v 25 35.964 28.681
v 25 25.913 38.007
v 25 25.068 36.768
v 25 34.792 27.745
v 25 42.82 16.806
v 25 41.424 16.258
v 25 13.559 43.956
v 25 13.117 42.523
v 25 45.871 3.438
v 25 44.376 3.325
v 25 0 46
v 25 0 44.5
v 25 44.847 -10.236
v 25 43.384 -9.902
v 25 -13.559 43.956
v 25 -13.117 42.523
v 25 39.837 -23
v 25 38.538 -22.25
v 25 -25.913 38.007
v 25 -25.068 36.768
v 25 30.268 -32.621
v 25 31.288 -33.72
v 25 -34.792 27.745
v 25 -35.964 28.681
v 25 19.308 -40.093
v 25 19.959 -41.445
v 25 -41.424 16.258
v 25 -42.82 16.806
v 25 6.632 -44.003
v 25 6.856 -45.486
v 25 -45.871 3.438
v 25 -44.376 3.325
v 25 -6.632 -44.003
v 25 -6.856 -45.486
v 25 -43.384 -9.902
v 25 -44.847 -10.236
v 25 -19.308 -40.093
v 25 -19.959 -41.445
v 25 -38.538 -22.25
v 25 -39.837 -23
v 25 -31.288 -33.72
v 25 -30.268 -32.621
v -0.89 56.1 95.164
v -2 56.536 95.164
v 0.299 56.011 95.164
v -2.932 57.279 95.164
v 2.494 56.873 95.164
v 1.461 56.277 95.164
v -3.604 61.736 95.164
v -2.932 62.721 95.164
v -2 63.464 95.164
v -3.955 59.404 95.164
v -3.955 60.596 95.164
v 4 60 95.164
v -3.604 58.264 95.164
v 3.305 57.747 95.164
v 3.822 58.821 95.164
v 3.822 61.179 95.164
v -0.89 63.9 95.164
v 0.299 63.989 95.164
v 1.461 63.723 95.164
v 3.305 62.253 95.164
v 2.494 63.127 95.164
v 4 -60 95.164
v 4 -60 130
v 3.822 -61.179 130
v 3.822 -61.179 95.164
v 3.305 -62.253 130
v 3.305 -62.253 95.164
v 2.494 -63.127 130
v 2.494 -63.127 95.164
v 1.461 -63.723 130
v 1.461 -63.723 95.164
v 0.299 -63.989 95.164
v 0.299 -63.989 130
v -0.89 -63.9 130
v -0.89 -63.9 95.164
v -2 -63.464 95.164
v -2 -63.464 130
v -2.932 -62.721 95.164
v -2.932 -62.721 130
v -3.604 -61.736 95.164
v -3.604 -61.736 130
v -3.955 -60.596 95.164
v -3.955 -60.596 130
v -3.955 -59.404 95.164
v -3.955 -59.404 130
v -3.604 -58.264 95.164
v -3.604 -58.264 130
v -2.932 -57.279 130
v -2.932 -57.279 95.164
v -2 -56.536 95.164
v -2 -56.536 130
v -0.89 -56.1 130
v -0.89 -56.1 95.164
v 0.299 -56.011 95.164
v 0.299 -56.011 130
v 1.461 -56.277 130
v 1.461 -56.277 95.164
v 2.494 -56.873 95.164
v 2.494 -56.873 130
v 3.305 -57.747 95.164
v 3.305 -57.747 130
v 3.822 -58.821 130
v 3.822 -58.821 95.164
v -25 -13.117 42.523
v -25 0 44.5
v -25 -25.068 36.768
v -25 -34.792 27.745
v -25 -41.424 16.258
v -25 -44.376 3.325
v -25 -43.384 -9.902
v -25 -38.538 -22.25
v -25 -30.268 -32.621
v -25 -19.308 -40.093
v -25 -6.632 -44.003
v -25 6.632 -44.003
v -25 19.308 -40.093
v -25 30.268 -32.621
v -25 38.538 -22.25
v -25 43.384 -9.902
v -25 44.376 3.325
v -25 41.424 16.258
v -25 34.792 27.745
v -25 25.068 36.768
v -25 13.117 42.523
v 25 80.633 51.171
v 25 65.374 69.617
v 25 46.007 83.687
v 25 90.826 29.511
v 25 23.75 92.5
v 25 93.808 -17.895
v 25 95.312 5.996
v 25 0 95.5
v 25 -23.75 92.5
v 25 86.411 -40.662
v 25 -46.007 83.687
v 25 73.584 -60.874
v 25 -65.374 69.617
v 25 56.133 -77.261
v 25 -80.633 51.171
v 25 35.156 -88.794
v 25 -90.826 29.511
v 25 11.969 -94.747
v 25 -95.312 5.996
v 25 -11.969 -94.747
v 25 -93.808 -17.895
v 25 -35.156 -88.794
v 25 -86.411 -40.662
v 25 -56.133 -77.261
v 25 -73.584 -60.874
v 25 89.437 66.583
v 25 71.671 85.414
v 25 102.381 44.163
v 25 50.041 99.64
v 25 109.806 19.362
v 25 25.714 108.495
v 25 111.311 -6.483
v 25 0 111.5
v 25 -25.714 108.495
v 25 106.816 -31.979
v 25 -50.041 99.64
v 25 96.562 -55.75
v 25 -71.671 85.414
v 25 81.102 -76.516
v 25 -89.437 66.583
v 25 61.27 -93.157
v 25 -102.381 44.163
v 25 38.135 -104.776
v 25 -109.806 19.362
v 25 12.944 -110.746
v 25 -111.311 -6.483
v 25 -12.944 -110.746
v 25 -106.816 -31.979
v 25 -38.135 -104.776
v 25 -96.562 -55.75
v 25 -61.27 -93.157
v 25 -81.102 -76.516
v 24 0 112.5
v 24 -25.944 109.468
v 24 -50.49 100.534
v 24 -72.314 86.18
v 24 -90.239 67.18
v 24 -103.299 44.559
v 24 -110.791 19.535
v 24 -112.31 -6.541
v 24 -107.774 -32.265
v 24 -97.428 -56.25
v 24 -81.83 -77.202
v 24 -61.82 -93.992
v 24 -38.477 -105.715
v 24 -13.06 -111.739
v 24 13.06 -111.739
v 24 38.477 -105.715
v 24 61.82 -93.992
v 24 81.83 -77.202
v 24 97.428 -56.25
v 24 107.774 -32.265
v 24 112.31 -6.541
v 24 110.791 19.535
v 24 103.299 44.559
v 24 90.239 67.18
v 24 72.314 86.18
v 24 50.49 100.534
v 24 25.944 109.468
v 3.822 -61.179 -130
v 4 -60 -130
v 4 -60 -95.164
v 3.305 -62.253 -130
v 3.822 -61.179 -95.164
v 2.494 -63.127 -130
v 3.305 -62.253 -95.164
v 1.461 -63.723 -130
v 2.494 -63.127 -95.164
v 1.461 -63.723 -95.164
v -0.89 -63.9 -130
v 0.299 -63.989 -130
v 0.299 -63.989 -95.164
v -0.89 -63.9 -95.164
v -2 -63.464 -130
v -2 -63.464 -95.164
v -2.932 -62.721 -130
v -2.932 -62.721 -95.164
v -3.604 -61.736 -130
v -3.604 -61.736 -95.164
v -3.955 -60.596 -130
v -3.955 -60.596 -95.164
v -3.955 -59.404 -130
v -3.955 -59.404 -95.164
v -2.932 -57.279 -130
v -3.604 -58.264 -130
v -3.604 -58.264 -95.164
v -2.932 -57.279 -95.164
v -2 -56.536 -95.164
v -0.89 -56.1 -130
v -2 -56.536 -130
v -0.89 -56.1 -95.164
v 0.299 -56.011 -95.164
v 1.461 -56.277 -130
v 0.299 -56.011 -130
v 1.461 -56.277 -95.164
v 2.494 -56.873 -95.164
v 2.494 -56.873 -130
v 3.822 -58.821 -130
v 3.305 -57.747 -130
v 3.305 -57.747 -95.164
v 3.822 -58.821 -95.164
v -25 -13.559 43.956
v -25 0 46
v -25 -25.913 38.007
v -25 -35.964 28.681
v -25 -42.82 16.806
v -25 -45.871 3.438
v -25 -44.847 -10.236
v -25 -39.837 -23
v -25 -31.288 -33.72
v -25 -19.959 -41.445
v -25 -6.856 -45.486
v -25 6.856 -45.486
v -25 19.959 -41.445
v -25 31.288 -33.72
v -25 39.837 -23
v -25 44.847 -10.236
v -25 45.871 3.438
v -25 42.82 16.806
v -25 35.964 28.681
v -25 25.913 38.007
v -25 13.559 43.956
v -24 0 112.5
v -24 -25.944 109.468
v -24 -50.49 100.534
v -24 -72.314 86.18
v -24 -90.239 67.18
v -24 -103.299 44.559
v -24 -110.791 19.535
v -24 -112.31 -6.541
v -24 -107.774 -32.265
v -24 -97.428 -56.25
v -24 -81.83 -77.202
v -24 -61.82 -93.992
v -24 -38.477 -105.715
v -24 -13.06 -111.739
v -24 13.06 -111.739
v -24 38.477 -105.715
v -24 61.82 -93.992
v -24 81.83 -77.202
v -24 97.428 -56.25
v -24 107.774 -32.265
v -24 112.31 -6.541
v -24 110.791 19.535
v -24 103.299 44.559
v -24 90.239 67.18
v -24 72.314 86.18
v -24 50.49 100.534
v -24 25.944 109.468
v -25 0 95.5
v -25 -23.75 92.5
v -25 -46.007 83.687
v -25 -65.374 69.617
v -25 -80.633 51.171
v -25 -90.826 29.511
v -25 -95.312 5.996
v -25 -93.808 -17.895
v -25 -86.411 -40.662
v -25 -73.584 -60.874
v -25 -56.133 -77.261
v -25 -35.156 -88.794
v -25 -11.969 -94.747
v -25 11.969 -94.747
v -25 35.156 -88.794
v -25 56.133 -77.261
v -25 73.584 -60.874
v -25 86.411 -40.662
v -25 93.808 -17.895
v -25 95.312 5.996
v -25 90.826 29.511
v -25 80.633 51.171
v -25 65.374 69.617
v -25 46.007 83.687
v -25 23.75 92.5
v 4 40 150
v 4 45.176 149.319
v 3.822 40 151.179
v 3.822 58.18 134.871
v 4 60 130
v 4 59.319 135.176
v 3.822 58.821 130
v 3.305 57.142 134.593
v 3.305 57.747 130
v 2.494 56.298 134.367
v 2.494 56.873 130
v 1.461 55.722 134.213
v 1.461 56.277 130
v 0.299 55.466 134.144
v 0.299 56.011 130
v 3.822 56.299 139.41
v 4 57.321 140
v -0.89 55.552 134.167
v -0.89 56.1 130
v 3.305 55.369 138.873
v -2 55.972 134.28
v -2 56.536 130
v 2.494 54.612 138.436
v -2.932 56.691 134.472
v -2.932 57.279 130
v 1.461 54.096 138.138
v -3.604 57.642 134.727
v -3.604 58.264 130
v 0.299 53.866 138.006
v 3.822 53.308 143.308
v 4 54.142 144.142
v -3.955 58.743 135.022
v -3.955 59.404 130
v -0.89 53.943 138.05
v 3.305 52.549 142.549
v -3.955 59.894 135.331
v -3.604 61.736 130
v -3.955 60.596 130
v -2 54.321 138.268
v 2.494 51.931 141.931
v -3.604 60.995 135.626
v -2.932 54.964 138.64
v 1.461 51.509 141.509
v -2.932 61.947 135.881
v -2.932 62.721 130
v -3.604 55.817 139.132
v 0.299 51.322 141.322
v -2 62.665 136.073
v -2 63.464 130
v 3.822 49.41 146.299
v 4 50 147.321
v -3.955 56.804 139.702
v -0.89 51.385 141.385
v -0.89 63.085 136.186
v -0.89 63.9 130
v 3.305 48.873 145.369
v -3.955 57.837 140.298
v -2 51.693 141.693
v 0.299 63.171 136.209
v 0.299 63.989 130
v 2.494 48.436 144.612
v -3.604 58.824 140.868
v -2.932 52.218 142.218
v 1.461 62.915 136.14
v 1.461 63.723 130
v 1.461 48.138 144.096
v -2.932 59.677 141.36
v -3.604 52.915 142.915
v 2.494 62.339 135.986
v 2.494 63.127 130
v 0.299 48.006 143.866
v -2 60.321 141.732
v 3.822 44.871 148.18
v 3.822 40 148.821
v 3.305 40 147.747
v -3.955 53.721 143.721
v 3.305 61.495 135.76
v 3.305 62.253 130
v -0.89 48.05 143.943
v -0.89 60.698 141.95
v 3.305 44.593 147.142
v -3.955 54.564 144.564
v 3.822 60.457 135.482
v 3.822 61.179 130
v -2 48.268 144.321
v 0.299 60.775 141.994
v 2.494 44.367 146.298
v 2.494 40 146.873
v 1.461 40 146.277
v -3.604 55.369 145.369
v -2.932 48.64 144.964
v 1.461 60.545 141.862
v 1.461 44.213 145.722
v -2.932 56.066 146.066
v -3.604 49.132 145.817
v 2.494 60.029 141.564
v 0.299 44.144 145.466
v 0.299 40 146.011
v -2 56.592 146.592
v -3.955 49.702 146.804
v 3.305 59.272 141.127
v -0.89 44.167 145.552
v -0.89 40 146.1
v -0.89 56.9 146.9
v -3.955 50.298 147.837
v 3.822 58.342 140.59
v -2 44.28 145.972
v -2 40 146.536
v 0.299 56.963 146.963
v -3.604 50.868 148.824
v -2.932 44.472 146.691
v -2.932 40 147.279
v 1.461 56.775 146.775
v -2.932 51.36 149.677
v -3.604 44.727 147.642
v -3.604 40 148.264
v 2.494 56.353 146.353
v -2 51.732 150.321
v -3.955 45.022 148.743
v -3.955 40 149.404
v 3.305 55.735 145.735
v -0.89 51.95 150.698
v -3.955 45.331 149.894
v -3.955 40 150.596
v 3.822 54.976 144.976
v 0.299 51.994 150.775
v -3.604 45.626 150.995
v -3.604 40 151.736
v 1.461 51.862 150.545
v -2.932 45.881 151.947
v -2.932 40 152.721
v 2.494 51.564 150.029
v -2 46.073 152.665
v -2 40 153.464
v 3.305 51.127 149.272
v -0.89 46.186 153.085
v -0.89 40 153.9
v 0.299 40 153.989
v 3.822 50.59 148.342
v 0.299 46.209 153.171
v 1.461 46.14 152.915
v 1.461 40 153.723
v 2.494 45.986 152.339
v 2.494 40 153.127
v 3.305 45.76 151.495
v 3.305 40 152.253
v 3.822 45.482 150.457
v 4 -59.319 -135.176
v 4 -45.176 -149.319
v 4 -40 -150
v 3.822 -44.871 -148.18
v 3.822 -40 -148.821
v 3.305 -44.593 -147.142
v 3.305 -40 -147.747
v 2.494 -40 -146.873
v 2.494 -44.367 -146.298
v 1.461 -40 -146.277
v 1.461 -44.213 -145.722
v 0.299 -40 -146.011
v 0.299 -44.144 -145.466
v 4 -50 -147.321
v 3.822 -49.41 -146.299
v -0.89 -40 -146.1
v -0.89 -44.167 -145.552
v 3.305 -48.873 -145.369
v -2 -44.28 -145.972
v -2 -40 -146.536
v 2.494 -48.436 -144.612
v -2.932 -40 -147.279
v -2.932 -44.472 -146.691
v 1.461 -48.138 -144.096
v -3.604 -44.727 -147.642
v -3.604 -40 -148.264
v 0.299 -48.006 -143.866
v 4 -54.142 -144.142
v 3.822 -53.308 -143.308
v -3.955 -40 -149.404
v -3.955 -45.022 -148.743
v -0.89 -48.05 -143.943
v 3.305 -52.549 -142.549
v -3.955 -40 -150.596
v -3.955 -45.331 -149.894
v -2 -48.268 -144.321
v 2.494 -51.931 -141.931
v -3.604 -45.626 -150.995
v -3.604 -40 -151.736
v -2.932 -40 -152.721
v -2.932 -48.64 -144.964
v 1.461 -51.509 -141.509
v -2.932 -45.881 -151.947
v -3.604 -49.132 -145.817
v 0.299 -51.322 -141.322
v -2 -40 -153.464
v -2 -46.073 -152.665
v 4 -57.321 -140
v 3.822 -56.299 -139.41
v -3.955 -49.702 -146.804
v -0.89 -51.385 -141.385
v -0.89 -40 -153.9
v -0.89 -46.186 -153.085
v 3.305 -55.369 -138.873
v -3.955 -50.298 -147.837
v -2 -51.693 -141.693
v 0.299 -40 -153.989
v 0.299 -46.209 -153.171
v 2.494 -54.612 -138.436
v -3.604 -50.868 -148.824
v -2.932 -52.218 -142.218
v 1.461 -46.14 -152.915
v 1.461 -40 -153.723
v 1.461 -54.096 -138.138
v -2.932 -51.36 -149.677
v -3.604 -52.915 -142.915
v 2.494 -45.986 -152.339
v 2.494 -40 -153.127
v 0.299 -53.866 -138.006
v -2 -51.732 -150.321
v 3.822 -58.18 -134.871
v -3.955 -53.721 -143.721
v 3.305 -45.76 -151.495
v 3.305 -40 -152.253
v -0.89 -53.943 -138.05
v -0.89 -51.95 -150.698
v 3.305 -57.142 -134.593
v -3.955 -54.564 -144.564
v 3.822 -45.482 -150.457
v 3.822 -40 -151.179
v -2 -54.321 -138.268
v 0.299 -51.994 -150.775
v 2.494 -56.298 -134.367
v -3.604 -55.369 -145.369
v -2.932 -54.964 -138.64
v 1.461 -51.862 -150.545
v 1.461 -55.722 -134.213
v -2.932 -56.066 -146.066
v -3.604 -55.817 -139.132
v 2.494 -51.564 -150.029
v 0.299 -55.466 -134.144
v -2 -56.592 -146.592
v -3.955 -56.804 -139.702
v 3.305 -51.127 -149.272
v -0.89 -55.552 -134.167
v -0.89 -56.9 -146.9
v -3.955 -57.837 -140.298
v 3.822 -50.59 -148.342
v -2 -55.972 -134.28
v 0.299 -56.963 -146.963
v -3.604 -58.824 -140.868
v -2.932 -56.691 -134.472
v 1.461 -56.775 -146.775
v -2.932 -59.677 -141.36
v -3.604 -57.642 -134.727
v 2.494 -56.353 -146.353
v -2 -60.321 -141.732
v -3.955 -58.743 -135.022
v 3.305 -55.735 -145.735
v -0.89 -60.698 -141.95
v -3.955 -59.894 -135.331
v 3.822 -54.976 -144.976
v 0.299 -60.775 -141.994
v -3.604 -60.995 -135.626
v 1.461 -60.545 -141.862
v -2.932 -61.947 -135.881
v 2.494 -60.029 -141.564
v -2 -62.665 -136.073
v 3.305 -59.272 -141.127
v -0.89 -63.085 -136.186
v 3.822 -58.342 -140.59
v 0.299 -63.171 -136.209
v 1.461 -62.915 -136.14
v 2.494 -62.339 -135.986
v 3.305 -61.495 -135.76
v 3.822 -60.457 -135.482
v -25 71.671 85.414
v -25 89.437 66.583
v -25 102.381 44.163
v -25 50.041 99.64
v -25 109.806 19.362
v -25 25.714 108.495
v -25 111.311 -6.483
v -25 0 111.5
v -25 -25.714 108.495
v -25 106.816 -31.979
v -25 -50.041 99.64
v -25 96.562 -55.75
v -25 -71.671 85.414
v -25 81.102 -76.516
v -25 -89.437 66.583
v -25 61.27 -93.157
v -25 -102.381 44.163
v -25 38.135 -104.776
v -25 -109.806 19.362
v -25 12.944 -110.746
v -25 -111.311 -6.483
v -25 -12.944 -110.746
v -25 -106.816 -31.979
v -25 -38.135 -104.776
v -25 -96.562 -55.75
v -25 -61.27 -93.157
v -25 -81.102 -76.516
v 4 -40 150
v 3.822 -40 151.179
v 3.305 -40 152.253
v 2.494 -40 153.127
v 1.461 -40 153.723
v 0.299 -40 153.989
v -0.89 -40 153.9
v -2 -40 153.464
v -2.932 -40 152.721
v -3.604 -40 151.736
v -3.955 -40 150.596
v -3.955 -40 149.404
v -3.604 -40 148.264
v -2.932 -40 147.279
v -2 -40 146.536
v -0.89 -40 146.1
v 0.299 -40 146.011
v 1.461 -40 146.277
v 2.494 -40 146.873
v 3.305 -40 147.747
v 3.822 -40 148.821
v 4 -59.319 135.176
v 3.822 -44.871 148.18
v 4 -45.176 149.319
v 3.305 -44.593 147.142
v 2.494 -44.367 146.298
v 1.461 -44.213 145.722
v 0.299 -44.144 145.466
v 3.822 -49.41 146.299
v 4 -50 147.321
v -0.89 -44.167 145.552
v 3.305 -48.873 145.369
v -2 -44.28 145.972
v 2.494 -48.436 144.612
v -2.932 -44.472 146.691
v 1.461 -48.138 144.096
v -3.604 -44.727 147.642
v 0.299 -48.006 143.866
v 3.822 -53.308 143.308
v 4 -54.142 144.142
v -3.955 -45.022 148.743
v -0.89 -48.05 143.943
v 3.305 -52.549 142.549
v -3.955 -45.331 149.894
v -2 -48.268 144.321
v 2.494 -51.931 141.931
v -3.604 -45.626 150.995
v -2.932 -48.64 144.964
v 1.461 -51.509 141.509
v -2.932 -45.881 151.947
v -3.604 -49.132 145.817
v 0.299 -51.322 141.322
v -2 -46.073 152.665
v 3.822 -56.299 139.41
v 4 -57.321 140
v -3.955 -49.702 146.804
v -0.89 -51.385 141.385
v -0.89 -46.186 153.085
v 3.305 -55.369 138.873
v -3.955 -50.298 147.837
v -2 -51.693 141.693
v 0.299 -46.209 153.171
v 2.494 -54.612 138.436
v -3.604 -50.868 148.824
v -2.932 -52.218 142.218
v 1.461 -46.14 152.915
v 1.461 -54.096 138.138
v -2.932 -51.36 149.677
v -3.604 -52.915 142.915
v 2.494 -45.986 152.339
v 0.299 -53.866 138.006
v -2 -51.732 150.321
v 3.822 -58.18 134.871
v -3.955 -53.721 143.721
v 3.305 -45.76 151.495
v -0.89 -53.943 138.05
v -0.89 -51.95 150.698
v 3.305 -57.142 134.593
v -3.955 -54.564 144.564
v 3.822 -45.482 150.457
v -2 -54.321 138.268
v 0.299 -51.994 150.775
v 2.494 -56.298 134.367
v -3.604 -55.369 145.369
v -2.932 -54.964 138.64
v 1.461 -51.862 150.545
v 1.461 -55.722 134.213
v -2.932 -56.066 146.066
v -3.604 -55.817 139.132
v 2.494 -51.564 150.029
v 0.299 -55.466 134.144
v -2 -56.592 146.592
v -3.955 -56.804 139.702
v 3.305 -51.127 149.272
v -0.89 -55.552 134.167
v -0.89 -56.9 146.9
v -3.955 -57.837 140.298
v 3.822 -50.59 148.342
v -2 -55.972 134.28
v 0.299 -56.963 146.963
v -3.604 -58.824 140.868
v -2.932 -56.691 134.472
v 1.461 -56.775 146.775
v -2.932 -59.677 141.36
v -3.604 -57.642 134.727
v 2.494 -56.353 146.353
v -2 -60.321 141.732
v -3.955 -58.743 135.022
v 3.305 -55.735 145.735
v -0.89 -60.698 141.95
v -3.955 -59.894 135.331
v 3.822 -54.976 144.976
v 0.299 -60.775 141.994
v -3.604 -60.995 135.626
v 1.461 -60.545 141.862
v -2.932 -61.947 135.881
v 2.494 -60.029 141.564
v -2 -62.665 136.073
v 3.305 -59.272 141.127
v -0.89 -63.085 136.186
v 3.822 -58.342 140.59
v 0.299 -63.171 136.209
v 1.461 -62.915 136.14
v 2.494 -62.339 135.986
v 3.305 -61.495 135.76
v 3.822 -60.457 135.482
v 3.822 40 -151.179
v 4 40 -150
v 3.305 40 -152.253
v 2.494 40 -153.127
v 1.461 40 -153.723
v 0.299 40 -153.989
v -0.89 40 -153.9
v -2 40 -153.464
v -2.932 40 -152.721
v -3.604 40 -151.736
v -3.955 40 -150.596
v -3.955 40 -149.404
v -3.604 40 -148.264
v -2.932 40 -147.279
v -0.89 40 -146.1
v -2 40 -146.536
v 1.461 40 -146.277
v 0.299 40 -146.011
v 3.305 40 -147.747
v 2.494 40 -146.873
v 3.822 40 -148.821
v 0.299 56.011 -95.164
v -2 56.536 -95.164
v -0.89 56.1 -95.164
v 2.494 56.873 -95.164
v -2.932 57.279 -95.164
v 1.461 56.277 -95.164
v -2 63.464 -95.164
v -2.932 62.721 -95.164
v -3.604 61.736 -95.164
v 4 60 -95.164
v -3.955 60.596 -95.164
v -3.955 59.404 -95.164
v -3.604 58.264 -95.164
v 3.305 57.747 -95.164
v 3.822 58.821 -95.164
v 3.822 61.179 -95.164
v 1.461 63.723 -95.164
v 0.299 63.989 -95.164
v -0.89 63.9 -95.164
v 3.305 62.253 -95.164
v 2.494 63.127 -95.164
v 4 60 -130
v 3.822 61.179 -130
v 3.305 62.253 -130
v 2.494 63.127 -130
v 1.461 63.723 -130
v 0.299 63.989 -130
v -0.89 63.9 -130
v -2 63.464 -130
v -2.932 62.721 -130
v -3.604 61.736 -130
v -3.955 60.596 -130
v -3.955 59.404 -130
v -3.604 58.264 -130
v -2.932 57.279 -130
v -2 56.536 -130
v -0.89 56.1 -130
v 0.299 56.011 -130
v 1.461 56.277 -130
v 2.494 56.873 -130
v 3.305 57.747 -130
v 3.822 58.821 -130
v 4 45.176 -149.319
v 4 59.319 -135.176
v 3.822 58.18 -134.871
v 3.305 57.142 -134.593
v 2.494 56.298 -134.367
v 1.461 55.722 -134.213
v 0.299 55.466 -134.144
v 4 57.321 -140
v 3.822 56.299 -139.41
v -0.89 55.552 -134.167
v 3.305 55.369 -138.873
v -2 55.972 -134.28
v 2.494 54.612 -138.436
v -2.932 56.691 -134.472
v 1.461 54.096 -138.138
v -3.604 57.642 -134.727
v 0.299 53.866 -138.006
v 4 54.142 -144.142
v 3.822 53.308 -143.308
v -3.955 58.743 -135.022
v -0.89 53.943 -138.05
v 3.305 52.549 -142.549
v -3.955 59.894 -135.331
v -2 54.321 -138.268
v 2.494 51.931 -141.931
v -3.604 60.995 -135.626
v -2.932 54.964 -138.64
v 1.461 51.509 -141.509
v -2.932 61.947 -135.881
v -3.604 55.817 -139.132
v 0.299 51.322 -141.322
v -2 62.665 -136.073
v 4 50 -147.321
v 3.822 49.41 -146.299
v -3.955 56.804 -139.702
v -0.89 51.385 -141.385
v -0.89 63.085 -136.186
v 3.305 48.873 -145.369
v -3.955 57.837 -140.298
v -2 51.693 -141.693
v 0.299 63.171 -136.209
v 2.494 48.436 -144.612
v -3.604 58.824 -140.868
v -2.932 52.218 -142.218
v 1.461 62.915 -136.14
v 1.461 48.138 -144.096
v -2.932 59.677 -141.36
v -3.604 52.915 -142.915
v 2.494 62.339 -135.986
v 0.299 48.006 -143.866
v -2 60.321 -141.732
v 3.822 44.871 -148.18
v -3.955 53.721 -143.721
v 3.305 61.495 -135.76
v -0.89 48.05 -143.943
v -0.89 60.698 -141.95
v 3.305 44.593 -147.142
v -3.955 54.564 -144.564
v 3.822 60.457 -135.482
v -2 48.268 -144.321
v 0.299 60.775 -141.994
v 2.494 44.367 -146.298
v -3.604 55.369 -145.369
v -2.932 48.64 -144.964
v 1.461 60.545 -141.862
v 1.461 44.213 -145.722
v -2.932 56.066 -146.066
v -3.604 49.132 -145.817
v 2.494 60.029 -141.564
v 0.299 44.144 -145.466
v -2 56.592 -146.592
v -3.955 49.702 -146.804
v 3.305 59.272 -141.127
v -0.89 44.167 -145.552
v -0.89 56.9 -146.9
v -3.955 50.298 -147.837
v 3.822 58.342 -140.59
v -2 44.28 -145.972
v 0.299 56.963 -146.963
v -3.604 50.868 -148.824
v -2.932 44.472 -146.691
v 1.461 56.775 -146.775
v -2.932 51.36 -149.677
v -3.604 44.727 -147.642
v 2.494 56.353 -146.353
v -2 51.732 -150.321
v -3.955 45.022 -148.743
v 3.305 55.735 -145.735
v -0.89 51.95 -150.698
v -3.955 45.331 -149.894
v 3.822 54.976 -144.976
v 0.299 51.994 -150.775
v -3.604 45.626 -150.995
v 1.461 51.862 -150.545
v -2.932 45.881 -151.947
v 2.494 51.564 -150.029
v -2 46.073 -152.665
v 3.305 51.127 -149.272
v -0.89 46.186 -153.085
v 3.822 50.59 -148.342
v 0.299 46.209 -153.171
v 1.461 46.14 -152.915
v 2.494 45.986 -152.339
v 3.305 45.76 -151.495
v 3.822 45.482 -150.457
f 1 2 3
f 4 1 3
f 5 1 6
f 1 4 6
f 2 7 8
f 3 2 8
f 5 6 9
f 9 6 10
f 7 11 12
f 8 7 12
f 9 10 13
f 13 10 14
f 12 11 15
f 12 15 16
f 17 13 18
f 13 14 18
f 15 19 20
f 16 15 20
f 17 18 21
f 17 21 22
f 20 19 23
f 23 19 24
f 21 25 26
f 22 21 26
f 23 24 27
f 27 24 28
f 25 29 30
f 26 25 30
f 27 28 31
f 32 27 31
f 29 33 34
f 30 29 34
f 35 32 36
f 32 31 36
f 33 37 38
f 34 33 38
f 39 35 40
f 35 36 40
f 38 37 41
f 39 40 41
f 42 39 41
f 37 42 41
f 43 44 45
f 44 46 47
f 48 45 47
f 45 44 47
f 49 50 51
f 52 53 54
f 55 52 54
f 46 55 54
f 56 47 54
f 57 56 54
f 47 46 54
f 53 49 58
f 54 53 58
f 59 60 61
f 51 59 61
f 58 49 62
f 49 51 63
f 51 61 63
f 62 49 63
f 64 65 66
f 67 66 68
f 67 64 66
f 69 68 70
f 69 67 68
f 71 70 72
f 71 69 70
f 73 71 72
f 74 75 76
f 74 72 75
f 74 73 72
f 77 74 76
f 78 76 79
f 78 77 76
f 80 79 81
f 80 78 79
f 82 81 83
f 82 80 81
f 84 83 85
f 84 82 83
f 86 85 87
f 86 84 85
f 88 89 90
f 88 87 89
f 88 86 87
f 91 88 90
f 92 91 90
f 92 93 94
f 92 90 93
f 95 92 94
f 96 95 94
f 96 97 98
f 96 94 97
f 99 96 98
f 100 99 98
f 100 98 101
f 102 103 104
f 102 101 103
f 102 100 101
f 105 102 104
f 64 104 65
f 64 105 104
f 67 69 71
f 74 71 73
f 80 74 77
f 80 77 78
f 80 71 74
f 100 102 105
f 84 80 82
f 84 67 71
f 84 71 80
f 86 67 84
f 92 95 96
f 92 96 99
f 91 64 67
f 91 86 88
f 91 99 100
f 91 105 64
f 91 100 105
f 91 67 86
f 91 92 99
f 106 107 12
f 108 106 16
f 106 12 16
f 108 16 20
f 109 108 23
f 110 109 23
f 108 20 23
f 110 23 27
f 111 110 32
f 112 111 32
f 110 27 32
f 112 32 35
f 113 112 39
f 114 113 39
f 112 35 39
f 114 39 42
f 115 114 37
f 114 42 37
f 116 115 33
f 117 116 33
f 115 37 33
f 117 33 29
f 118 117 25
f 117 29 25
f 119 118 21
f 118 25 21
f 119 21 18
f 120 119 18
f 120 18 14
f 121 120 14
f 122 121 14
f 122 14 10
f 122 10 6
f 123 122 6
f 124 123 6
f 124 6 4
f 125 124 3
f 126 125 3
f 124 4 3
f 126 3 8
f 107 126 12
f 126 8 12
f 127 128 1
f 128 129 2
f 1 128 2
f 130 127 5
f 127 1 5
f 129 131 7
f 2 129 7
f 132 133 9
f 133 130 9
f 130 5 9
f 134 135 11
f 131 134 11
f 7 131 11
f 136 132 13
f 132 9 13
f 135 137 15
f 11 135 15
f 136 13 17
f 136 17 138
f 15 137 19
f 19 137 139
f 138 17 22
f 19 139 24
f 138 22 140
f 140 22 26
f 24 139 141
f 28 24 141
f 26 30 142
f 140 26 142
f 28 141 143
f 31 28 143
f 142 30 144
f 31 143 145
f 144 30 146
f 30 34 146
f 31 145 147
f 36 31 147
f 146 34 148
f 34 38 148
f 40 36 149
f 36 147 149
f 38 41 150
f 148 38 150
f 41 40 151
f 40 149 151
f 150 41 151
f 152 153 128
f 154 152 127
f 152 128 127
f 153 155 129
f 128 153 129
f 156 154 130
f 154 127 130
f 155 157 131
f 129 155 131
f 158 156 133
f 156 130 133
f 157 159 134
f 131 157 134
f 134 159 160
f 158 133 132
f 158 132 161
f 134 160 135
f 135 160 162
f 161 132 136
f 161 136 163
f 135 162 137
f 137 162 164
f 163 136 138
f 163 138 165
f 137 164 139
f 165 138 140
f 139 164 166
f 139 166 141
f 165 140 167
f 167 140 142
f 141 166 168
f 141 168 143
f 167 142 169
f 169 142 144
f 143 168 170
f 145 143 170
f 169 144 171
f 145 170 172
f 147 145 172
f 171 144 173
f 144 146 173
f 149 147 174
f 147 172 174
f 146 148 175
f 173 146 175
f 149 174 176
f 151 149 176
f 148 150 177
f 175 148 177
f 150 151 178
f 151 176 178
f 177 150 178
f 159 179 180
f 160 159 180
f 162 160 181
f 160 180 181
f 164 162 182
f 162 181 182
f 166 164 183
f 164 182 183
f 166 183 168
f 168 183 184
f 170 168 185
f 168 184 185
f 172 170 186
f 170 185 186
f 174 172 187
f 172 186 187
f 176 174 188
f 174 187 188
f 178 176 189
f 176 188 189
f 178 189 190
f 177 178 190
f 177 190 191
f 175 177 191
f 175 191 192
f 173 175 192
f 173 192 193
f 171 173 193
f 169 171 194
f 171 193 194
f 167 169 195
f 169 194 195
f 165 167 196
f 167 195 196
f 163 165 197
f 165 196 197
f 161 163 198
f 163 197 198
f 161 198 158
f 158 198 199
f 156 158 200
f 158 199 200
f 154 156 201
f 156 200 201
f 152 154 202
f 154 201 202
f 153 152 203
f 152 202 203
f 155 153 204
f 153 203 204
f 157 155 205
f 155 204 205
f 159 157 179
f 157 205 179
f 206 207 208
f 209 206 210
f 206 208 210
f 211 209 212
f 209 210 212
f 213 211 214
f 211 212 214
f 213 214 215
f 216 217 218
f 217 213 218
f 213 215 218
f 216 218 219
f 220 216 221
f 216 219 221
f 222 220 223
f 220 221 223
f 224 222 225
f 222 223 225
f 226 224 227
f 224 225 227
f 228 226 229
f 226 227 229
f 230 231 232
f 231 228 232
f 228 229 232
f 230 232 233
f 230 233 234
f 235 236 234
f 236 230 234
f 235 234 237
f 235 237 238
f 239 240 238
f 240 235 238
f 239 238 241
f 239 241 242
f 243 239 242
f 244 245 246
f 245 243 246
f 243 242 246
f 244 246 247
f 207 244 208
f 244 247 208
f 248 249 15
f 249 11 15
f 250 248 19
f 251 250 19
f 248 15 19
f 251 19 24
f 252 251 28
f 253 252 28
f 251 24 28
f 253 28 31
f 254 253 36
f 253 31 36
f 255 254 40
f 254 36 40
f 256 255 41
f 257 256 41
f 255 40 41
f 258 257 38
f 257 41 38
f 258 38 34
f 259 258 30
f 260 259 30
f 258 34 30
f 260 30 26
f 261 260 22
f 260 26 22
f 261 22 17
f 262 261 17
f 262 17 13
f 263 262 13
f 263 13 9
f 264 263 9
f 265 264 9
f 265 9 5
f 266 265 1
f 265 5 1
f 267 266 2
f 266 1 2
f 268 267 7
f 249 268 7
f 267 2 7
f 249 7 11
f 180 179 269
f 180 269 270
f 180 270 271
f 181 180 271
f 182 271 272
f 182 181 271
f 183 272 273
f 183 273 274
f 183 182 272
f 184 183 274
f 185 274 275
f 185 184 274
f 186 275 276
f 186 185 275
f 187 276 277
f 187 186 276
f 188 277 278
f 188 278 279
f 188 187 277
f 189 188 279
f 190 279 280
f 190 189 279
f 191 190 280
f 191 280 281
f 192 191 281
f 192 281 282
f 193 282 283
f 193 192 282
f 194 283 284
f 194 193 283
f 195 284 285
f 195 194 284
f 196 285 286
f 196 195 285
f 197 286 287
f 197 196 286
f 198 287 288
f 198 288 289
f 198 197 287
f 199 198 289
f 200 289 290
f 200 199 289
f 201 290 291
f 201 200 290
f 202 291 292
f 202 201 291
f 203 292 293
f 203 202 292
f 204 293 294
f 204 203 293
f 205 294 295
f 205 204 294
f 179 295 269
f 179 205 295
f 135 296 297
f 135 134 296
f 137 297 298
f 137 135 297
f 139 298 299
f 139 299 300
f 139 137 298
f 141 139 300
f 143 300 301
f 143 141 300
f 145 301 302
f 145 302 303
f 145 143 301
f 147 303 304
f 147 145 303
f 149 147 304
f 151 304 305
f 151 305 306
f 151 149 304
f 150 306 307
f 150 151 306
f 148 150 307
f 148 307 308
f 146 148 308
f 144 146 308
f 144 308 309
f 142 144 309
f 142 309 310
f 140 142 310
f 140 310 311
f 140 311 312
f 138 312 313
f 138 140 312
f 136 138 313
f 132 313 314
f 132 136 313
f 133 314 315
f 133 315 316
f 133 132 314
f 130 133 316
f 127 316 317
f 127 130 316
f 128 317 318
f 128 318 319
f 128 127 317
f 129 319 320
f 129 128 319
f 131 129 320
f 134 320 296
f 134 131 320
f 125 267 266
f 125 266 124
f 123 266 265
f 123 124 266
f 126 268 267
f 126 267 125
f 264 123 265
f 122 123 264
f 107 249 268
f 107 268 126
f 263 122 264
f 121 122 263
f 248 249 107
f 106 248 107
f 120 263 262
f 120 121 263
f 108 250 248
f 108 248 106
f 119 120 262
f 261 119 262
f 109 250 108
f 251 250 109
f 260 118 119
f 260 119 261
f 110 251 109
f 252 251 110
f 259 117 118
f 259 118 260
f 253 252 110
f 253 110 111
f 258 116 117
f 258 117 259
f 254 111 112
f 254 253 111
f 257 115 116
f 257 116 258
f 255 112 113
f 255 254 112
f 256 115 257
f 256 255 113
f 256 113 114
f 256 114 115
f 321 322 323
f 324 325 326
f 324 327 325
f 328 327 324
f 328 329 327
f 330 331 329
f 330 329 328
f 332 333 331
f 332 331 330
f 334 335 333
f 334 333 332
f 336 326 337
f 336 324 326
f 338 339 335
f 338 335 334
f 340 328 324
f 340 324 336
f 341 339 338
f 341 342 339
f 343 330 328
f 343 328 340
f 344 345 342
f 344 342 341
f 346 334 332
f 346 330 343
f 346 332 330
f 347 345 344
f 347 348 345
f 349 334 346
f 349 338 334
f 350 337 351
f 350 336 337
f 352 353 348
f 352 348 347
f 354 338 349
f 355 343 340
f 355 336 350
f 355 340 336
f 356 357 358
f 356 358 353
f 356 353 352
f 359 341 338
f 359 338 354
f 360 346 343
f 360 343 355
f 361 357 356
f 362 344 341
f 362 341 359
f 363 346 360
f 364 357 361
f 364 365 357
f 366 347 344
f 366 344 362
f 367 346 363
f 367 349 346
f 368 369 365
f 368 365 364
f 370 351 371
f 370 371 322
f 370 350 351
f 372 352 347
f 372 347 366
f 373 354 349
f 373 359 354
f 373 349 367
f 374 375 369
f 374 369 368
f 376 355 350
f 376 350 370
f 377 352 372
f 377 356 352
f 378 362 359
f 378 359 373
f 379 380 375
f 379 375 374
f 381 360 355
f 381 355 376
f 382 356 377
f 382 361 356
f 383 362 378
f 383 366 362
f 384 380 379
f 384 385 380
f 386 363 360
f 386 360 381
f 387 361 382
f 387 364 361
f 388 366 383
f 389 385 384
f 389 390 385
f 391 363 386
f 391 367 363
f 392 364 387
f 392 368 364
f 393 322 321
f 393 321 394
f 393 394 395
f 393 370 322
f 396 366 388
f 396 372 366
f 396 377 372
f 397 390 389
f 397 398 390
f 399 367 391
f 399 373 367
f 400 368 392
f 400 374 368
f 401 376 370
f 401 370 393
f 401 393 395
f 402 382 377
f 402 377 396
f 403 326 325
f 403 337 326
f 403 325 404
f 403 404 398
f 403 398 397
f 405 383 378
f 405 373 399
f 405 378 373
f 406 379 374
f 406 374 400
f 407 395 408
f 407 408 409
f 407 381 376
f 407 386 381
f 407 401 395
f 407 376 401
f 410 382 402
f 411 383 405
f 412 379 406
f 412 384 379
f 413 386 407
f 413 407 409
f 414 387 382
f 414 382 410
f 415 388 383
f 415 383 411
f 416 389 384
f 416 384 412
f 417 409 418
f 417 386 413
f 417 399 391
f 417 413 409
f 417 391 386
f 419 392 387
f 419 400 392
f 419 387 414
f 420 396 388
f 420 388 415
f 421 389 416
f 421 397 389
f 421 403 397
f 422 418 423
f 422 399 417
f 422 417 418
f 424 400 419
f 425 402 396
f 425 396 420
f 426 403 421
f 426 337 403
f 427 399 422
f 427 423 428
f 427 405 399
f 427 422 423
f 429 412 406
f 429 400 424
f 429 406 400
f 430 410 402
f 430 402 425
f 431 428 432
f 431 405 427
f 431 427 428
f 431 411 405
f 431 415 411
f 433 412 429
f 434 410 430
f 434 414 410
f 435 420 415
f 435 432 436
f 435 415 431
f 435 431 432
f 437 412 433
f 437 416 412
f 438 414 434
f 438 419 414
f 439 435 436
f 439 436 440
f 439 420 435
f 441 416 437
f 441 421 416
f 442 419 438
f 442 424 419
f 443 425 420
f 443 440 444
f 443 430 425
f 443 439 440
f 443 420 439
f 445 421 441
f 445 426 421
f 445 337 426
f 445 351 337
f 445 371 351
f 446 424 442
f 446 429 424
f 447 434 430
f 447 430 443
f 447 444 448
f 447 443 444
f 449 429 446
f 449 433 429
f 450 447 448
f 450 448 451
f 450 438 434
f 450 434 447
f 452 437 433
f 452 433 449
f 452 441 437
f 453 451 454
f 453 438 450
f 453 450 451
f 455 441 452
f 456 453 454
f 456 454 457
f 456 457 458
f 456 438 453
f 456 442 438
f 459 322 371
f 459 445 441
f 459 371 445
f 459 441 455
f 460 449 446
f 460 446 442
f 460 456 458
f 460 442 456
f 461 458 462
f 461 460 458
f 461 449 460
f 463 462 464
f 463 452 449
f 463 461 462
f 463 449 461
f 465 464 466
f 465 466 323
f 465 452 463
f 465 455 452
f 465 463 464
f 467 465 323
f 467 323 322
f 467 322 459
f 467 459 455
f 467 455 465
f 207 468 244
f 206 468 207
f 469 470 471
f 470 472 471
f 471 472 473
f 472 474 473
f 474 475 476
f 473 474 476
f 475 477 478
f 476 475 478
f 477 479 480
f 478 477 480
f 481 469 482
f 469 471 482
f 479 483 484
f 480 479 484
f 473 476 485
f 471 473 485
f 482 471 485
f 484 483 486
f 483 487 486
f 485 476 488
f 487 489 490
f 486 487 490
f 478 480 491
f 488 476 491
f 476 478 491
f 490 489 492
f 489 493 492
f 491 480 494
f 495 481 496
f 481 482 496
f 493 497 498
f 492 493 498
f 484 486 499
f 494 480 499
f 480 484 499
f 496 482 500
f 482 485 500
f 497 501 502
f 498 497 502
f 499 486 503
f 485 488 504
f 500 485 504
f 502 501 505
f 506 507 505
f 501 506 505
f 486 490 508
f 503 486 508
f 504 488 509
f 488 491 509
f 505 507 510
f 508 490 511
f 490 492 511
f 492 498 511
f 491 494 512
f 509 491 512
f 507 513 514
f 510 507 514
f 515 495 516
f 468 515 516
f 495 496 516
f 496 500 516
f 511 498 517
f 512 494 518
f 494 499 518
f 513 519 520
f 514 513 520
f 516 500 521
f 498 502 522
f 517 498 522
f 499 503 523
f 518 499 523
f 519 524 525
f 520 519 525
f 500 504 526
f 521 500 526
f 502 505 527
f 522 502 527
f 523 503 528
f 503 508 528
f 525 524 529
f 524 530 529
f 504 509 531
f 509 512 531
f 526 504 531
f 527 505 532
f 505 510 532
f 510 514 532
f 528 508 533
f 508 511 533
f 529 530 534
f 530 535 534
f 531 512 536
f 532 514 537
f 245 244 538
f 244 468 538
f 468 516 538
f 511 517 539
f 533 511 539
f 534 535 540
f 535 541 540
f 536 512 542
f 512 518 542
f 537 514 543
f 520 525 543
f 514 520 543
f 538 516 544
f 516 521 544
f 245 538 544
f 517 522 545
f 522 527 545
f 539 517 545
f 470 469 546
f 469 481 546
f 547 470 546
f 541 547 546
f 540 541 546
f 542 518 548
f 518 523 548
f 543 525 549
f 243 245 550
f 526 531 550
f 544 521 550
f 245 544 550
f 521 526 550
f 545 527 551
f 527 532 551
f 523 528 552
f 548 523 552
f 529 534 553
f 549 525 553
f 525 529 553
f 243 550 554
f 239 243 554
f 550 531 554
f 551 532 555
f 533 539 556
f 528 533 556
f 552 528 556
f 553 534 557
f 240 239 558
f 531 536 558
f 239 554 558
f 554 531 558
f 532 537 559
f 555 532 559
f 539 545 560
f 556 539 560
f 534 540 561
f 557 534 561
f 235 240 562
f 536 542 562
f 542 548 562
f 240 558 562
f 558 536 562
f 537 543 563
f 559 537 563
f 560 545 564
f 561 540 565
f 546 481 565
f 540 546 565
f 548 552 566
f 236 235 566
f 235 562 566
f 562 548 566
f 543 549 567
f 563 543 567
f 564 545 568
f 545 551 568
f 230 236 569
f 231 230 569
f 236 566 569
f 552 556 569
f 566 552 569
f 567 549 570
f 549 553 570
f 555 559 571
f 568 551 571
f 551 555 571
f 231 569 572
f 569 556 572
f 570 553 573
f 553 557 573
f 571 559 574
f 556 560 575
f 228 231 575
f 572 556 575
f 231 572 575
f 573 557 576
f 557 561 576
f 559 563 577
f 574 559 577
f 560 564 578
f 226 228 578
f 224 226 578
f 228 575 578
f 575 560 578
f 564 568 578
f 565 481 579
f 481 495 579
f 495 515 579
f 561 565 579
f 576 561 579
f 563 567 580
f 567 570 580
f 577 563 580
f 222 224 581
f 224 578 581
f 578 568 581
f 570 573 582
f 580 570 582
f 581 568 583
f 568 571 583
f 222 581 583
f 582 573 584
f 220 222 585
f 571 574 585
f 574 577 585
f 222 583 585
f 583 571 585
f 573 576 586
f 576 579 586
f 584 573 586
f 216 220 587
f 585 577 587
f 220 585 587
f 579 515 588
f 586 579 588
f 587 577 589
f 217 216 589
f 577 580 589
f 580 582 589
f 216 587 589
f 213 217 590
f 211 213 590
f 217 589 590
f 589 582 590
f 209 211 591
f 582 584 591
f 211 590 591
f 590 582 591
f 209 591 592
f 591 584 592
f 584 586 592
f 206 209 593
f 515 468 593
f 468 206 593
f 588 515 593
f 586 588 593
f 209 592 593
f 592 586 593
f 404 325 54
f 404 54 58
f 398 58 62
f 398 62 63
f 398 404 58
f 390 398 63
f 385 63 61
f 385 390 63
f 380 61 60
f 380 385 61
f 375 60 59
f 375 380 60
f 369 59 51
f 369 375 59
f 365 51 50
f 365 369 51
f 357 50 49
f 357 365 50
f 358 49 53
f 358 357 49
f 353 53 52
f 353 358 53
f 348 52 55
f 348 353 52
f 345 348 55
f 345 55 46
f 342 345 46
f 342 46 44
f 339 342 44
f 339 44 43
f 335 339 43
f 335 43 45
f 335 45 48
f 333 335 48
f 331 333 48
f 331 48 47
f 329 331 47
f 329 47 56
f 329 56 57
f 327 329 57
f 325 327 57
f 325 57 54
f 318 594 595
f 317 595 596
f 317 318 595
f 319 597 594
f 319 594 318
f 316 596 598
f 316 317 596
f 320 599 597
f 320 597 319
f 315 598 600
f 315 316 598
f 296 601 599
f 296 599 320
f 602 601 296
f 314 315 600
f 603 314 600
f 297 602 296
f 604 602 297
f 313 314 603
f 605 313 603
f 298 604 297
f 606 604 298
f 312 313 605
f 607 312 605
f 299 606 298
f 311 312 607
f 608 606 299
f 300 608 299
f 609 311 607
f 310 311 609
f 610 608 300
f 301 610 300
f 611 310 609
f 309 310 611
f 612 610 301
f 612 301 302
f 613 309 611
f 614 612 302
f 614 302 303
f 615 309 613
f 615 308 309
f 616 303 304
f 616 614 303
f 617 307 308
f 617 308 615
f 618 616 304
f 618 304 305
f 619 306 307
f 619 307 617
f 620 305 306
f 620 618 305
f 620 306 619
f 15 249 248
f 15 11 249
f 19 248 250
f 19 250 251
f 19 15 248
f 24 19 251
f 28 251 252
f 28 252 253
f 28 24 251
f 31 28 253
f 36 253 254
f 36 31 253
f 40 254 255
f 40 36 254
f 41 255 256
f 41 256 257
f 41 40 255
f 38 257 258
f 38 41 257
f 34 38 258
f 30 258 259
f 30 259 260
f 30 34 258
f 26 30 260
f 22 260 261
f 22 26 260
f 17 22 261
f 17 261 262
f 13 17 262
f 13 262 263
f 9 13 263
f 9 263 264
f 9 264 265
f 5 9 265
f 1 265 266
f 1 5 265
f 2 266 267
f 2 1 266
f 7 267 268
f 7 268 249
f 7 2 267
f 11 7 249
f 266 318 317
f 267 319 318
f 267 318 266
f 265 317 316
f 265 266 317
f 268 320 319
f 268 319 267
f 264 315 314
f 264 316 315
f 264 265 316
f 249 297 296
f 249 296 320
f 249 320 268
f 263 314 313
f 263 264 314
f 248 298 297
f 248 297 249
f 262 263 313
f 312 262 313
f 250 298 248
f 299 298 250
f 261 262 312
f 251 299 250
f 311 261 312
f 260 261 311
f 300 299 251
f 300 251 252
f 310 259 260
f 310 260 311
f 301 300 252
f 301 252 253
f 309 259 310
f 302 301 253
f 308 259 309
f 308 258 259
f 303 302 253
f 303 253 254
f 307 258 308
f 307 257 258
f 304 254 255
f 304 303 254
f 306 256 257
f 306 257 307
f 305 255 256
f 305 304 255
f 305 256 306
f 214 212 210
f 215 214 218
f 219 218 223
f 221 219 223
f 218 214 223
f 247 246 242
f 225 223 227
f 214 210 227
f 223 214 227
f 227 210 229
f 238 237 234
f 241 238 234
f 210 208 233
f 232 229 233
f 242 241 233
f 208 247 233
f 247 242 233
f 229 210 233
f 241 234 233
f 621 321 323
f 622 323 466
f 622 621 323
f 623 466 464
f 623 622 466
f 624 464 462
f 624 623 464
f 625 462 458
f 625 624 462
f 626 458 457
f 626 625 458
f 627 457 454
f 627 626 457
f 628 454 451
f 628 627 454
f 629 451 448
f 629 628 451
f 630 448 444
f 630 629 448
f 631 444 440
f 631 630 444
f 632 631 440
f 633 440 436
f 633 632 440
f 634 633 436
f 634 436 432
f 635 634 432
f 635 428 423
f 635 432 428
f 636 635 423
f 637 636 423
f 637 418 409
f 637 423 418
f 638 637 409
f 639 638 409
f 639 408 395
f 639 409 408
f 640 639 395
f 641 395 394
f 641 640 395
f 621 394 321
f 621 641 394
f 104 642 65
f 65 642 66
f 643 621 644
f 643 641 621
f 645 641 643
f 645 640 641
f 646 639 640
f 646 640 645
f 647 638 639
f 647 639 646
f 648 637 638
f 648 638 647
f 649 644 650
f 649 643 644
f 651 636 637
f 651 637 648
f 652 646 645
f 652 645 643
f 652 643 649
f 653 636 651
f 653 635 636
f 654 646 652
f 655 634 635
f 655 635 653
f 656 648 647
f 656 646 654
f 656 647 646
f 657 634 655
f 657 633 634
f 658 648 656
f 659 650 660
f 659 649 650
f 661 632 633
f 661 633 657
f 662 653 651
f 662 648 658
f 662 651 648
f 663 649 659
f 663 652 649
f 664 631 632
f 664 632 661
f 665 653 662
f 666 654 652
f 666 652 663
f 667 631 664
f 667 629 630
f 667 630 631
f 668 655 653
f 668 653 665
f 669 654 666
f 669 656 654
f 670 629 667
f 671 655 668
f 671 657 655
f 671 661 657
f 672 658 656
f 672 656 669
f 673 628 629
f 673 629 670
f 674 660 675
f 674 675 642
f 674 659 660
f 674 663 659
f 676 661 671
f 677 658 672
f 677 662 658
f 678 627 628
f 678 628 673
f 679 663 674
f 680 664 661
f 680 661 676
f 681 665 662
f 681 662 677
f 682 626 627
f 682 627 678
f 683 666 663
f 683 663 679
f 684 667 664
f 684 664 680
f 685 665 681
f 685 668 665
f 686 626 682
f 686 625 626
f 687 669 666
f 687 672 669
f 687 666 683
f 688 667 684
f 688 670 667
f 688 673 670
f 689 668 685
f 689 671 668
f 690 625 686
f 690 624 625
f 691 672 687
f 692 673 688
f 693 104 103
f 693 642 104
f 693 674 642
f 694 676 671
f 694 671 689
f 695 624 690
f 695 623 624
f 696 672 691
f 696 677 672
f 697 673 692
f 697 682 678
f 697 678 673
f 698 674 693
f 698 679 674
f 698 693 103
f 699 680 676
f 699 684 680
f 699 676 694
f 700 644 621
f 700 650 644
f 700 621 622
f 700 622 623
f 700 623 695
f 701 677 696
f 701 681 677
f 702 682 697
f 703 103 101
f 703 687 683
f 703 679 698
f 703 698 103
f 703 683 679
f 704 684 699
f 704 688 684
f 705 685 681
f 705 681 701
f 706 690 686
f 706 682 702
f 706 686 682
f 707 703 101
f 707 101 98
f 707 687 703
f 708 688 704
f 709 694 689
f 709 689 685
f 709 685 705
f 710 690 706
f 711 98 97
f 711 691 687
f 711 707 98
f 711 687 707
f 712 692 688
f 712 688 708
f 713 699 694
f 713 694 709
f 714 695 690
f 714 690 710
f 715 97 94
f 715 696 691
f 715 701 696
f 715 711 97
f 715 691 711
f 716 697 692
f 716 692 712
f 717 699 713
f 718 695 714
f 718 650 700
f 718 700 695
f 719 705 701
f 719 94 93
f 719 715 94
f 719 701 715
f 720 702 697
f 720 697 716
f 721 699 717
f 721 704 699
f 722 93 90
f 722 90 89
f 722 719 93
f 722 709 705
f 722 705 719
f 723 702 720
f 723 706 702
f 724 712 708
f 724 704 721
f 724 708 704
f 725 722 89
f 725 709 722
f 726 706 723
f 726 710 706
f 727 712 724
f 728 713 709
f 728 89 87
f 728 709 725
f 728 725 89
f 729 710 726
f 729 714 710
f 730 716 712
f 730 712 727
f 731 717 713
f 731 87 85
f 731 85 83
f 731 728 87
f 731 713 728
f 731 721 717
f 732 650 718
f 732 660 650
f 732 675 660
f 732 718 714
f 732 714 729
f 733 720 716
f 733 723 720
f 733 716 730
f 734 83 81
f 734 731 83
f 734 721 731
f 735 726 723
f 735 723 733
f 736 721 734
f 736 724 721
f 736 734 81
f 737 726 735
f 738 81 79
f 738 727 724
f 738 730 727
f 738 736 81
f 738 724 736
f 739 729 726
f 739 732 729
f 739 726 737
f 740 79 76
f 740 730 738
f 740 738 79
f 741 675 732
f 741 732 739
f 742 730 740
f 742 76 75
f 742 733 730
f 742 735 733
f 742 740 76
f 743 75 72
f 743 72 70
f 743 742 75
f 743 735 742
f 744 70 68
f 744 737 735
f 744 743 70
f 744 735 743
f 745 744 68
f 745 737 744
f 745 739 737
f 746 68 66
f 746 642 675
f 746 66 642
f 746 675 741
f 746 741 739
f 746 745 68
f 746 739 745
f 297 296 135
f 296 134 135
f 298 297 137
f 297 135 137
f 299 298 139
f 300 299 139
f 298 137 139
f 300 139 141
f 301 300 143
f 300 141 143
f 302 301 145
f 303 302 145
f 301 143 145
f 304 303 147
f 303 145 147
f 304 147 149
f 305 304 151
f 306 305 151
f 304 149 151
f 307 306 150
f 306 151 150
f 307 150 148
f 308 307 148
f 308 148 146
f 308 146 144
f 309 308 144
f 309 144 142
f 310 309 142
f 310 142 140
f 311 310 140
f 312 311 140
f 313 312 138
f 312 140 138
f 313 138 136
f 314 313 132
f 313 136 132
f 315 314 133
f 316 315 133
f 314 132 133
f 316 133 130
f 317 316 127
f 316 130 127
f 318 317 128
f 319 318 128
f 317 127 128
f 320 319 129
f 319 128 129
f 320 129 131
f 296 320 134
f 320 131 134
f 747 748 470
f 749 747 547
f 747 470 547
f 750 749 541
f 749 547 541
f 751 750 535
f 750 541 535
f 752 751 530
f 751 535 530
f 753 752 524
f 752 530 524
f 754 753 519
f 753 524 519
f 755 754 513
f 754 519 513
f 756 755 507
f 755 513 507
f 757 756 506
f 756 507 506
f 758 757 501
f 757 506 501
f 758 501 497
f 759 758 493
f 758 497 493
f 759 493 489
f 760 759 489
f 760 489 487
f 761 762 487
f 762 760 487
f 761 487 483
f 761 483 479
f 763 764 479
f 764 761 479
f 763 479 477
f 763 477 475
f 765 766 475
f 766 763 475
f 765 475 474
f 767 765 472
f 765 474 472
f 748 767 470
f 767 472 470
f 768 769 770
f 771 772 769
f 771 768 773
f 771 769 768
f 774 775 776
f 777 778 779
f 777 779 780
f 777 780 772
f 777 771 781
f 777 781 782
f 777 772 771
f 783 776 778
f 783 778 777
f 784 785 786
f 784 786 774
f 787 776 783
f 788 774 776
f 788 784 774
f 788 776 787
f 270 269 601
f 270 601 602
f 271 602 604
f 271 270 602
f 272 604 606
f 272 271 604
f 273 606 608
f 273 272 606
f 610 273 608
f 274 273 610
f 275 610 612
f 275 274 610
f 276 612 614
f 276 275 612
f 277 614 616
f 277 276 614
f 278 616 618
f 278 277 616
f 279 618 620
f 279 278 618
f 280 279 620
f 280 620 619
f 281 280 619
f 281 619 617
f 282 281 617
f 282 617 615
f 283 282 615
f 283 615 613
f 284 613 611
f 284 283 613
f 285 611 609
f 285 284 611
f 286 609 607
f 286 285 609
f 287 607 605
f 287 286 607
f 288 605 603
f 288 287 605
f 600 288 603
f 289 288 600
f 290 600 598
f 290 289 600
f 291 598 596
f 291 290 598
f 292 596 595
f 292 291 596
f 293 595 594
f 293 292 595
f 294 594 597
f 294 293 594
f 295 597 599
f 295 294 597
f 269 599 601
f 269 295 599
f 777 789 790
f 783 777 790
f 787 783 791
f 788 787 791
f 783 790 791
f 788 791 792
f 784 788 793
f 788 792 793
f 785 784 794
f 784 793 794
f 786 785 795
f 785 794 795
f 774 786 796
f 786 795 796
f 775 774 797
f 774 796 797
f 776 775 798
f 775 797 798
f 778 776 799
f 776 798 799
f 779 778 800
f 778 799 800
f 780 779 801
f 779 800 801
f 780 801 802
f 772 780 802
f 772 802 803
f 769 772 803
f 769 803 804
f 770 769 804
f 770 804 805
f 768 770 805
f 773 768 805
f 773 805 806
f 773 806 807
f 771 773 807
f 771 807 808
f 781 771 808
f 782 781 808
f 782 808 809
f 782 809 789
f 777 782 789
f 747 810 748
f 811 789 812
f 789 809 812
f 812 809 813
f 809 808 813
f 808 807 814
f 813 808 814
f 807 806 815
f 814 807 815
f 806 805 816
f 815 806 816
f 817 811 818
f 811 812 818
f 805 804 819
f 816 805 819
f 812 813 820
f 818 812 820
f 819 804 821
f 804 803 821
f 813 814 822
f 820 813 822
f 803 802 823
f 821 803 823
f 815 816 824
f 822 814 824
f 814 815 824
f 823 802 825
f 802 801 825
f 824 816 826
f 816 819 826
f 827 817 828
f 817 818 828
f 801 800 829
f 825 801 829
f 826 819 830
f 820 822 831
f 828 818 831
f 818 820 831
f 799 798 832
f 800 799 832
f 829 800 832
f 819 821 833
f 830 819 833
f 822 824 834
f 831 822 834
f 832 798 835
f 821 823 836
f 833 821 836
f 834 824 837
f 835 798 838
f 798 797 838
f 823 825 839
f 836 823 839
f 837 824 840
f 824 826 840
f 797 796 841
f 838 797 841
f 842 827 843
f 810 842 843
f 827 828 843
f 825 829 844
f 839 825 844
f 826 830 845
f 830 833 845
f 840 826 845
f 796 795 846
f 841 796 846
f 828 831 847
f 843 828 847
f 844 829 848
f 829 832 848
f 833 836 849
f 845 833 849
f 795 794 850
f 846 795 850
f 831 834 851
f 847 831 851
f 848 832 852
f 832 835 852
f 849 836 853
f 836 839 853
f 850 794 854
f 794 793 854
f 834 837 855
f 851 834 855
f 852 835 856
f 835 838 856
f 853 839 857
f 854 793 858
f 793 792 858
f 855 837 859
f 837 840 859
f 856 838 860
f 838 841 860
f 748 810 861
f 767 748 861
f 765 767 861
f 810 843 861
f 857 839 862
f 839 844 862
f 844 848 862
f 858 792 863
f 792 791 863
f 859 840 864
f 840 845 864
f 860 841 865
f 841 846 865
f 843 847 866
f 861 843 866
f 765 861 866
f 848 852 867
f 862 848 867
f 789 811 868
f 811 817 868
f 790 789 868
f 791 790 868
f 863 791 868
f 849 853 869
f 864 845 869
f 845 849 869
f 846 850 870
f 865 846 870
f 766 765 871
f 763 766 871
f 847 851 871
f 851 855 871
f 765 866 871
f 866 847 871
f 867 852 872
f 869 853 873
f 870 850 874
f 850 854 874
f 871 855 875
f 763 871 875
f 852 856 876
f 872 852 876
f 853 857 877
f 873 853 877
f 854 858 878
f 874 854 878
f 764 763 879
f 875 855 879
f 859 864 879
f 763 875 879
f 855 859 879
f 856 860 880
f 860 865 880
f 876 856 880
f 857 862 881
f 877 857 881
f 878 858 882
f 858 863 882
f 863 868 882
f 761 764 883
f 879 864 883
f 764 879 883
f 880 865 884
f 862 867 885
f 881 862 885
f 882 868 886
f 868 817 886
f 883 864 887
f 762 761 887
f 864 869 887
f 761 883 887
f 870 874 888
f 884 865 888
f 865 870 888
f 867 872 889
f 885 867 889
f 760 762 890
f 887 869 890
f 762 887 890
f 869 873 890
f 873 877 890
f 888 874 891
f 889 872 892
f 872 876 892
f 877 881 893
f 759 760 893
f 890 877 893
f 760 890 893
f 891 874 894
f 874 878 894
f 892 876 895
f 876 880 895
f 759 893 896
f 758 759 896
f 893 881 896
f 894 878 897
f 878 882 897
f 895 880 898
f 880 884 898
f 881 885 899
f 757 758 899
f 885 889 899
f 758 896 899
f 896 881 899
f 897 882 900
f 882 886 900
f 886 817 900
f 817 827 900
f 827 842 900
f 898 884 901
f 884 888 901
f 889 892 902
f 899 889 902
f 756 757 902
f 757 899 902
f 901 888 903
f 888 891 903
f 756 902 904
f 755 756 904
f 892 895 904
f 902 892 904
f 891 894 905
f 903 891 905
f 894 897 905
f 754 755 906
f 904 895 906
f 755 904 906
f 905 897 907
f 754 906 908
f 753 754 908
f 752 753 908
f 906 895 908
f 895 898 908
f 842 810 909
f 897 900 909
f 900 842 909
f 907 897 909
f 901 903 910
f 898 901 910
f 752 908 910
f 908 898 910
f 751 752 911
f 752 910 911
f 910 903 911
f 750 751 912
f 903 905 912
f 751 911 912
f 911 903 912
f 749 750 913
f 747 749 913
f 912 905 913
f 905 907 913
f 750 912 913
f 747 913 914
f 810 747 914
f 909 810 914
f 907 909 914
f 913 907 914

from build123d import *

# Parameters (mm, degrees)
F0_W     = 50
F0_H     = 1.5
F2_W     = 50
F2_H     = 49.5
F3_W     = 50
F3_H     = 17
F8_R     = 4
F10_SIZE = 1


# Not quite as in the source:
# - a pattern or mirror of a feature is missing from the dataset's text; its kind, count and spacing are read off the source's solid


with BuildPart() as f1:
    # F0 (on Front) → F1 (revolve)
    with BuildSketch(Plane.XZ):
        with Locations((0, 45.25)):
            Rectangle(F0_W, F0_H)
    revolve(axis=Axis((-0.9286299391, 0, 0), (1, 0, 0)))


with BuildPart() as f4:
    # F2 (on Front) → F4 (revolve)
    with BuildSketch(Plane.XZ):
        with Locations((0, 70.75)):
            Rectangle(F2_W, F2_H)
    revolve(axis=Axis((5.5879e-06, 0, 0), (1, 0, 0)))


with BuildPart() as f5:
    # F3 (on Front) → F5 (revolve)
    with BuildSketch(Plane.XZ):
        with Locations((0, 104)):
            Rectangle(F3_W, F3_H)
    revolve(axis=Axis((-0.9286299391, 0, 0), (1, 0, 0)))

    # F10
    f10_edges = [f5.edges().sort_by_distance(p)[0] for p in [
        (25, 0, -112.5),
        (-25, 0, -112.5),
    ]]
    chamfer(f10_edges, length=F10_SIZE)


with BuildPart() as f9:
    # F9: sweep along a path in F6
    with BuildLine(Plane.YZ) as f9_path:
        Line((60, 95.1643315534), (60, 130))
        ThreePointArc((60, 130), (54.1421356237, 144.1421356237), (40, 150))
        Line((40, 150), (-40, 150))
        ThreePointArc((-40, 150), (-54.1421356237, 144.1421356237), (-60, 130))
        Line((-60, 130), (-60, 95.1643315534))
    # F8 (on plane+point) → F9 (sweep)
    with BuildSketch(Plane.XY.offset(95.1643315534)):
        with Locations((0, 60)):
            Circle(F8_R)
    sweep(path=f9_path.line)


with BuildPart() as f9_copies_1:
    # F9_copies: instance of F9
    add(f9.part.mirror(Plane(origin=(0, 0, 0), x_dir=(-1, 0, 0), z_dir=(0, 0, -1))))


solid = Compound([f1.part, f4.part, f5.part, f9.part, f9_copies_1.part])
